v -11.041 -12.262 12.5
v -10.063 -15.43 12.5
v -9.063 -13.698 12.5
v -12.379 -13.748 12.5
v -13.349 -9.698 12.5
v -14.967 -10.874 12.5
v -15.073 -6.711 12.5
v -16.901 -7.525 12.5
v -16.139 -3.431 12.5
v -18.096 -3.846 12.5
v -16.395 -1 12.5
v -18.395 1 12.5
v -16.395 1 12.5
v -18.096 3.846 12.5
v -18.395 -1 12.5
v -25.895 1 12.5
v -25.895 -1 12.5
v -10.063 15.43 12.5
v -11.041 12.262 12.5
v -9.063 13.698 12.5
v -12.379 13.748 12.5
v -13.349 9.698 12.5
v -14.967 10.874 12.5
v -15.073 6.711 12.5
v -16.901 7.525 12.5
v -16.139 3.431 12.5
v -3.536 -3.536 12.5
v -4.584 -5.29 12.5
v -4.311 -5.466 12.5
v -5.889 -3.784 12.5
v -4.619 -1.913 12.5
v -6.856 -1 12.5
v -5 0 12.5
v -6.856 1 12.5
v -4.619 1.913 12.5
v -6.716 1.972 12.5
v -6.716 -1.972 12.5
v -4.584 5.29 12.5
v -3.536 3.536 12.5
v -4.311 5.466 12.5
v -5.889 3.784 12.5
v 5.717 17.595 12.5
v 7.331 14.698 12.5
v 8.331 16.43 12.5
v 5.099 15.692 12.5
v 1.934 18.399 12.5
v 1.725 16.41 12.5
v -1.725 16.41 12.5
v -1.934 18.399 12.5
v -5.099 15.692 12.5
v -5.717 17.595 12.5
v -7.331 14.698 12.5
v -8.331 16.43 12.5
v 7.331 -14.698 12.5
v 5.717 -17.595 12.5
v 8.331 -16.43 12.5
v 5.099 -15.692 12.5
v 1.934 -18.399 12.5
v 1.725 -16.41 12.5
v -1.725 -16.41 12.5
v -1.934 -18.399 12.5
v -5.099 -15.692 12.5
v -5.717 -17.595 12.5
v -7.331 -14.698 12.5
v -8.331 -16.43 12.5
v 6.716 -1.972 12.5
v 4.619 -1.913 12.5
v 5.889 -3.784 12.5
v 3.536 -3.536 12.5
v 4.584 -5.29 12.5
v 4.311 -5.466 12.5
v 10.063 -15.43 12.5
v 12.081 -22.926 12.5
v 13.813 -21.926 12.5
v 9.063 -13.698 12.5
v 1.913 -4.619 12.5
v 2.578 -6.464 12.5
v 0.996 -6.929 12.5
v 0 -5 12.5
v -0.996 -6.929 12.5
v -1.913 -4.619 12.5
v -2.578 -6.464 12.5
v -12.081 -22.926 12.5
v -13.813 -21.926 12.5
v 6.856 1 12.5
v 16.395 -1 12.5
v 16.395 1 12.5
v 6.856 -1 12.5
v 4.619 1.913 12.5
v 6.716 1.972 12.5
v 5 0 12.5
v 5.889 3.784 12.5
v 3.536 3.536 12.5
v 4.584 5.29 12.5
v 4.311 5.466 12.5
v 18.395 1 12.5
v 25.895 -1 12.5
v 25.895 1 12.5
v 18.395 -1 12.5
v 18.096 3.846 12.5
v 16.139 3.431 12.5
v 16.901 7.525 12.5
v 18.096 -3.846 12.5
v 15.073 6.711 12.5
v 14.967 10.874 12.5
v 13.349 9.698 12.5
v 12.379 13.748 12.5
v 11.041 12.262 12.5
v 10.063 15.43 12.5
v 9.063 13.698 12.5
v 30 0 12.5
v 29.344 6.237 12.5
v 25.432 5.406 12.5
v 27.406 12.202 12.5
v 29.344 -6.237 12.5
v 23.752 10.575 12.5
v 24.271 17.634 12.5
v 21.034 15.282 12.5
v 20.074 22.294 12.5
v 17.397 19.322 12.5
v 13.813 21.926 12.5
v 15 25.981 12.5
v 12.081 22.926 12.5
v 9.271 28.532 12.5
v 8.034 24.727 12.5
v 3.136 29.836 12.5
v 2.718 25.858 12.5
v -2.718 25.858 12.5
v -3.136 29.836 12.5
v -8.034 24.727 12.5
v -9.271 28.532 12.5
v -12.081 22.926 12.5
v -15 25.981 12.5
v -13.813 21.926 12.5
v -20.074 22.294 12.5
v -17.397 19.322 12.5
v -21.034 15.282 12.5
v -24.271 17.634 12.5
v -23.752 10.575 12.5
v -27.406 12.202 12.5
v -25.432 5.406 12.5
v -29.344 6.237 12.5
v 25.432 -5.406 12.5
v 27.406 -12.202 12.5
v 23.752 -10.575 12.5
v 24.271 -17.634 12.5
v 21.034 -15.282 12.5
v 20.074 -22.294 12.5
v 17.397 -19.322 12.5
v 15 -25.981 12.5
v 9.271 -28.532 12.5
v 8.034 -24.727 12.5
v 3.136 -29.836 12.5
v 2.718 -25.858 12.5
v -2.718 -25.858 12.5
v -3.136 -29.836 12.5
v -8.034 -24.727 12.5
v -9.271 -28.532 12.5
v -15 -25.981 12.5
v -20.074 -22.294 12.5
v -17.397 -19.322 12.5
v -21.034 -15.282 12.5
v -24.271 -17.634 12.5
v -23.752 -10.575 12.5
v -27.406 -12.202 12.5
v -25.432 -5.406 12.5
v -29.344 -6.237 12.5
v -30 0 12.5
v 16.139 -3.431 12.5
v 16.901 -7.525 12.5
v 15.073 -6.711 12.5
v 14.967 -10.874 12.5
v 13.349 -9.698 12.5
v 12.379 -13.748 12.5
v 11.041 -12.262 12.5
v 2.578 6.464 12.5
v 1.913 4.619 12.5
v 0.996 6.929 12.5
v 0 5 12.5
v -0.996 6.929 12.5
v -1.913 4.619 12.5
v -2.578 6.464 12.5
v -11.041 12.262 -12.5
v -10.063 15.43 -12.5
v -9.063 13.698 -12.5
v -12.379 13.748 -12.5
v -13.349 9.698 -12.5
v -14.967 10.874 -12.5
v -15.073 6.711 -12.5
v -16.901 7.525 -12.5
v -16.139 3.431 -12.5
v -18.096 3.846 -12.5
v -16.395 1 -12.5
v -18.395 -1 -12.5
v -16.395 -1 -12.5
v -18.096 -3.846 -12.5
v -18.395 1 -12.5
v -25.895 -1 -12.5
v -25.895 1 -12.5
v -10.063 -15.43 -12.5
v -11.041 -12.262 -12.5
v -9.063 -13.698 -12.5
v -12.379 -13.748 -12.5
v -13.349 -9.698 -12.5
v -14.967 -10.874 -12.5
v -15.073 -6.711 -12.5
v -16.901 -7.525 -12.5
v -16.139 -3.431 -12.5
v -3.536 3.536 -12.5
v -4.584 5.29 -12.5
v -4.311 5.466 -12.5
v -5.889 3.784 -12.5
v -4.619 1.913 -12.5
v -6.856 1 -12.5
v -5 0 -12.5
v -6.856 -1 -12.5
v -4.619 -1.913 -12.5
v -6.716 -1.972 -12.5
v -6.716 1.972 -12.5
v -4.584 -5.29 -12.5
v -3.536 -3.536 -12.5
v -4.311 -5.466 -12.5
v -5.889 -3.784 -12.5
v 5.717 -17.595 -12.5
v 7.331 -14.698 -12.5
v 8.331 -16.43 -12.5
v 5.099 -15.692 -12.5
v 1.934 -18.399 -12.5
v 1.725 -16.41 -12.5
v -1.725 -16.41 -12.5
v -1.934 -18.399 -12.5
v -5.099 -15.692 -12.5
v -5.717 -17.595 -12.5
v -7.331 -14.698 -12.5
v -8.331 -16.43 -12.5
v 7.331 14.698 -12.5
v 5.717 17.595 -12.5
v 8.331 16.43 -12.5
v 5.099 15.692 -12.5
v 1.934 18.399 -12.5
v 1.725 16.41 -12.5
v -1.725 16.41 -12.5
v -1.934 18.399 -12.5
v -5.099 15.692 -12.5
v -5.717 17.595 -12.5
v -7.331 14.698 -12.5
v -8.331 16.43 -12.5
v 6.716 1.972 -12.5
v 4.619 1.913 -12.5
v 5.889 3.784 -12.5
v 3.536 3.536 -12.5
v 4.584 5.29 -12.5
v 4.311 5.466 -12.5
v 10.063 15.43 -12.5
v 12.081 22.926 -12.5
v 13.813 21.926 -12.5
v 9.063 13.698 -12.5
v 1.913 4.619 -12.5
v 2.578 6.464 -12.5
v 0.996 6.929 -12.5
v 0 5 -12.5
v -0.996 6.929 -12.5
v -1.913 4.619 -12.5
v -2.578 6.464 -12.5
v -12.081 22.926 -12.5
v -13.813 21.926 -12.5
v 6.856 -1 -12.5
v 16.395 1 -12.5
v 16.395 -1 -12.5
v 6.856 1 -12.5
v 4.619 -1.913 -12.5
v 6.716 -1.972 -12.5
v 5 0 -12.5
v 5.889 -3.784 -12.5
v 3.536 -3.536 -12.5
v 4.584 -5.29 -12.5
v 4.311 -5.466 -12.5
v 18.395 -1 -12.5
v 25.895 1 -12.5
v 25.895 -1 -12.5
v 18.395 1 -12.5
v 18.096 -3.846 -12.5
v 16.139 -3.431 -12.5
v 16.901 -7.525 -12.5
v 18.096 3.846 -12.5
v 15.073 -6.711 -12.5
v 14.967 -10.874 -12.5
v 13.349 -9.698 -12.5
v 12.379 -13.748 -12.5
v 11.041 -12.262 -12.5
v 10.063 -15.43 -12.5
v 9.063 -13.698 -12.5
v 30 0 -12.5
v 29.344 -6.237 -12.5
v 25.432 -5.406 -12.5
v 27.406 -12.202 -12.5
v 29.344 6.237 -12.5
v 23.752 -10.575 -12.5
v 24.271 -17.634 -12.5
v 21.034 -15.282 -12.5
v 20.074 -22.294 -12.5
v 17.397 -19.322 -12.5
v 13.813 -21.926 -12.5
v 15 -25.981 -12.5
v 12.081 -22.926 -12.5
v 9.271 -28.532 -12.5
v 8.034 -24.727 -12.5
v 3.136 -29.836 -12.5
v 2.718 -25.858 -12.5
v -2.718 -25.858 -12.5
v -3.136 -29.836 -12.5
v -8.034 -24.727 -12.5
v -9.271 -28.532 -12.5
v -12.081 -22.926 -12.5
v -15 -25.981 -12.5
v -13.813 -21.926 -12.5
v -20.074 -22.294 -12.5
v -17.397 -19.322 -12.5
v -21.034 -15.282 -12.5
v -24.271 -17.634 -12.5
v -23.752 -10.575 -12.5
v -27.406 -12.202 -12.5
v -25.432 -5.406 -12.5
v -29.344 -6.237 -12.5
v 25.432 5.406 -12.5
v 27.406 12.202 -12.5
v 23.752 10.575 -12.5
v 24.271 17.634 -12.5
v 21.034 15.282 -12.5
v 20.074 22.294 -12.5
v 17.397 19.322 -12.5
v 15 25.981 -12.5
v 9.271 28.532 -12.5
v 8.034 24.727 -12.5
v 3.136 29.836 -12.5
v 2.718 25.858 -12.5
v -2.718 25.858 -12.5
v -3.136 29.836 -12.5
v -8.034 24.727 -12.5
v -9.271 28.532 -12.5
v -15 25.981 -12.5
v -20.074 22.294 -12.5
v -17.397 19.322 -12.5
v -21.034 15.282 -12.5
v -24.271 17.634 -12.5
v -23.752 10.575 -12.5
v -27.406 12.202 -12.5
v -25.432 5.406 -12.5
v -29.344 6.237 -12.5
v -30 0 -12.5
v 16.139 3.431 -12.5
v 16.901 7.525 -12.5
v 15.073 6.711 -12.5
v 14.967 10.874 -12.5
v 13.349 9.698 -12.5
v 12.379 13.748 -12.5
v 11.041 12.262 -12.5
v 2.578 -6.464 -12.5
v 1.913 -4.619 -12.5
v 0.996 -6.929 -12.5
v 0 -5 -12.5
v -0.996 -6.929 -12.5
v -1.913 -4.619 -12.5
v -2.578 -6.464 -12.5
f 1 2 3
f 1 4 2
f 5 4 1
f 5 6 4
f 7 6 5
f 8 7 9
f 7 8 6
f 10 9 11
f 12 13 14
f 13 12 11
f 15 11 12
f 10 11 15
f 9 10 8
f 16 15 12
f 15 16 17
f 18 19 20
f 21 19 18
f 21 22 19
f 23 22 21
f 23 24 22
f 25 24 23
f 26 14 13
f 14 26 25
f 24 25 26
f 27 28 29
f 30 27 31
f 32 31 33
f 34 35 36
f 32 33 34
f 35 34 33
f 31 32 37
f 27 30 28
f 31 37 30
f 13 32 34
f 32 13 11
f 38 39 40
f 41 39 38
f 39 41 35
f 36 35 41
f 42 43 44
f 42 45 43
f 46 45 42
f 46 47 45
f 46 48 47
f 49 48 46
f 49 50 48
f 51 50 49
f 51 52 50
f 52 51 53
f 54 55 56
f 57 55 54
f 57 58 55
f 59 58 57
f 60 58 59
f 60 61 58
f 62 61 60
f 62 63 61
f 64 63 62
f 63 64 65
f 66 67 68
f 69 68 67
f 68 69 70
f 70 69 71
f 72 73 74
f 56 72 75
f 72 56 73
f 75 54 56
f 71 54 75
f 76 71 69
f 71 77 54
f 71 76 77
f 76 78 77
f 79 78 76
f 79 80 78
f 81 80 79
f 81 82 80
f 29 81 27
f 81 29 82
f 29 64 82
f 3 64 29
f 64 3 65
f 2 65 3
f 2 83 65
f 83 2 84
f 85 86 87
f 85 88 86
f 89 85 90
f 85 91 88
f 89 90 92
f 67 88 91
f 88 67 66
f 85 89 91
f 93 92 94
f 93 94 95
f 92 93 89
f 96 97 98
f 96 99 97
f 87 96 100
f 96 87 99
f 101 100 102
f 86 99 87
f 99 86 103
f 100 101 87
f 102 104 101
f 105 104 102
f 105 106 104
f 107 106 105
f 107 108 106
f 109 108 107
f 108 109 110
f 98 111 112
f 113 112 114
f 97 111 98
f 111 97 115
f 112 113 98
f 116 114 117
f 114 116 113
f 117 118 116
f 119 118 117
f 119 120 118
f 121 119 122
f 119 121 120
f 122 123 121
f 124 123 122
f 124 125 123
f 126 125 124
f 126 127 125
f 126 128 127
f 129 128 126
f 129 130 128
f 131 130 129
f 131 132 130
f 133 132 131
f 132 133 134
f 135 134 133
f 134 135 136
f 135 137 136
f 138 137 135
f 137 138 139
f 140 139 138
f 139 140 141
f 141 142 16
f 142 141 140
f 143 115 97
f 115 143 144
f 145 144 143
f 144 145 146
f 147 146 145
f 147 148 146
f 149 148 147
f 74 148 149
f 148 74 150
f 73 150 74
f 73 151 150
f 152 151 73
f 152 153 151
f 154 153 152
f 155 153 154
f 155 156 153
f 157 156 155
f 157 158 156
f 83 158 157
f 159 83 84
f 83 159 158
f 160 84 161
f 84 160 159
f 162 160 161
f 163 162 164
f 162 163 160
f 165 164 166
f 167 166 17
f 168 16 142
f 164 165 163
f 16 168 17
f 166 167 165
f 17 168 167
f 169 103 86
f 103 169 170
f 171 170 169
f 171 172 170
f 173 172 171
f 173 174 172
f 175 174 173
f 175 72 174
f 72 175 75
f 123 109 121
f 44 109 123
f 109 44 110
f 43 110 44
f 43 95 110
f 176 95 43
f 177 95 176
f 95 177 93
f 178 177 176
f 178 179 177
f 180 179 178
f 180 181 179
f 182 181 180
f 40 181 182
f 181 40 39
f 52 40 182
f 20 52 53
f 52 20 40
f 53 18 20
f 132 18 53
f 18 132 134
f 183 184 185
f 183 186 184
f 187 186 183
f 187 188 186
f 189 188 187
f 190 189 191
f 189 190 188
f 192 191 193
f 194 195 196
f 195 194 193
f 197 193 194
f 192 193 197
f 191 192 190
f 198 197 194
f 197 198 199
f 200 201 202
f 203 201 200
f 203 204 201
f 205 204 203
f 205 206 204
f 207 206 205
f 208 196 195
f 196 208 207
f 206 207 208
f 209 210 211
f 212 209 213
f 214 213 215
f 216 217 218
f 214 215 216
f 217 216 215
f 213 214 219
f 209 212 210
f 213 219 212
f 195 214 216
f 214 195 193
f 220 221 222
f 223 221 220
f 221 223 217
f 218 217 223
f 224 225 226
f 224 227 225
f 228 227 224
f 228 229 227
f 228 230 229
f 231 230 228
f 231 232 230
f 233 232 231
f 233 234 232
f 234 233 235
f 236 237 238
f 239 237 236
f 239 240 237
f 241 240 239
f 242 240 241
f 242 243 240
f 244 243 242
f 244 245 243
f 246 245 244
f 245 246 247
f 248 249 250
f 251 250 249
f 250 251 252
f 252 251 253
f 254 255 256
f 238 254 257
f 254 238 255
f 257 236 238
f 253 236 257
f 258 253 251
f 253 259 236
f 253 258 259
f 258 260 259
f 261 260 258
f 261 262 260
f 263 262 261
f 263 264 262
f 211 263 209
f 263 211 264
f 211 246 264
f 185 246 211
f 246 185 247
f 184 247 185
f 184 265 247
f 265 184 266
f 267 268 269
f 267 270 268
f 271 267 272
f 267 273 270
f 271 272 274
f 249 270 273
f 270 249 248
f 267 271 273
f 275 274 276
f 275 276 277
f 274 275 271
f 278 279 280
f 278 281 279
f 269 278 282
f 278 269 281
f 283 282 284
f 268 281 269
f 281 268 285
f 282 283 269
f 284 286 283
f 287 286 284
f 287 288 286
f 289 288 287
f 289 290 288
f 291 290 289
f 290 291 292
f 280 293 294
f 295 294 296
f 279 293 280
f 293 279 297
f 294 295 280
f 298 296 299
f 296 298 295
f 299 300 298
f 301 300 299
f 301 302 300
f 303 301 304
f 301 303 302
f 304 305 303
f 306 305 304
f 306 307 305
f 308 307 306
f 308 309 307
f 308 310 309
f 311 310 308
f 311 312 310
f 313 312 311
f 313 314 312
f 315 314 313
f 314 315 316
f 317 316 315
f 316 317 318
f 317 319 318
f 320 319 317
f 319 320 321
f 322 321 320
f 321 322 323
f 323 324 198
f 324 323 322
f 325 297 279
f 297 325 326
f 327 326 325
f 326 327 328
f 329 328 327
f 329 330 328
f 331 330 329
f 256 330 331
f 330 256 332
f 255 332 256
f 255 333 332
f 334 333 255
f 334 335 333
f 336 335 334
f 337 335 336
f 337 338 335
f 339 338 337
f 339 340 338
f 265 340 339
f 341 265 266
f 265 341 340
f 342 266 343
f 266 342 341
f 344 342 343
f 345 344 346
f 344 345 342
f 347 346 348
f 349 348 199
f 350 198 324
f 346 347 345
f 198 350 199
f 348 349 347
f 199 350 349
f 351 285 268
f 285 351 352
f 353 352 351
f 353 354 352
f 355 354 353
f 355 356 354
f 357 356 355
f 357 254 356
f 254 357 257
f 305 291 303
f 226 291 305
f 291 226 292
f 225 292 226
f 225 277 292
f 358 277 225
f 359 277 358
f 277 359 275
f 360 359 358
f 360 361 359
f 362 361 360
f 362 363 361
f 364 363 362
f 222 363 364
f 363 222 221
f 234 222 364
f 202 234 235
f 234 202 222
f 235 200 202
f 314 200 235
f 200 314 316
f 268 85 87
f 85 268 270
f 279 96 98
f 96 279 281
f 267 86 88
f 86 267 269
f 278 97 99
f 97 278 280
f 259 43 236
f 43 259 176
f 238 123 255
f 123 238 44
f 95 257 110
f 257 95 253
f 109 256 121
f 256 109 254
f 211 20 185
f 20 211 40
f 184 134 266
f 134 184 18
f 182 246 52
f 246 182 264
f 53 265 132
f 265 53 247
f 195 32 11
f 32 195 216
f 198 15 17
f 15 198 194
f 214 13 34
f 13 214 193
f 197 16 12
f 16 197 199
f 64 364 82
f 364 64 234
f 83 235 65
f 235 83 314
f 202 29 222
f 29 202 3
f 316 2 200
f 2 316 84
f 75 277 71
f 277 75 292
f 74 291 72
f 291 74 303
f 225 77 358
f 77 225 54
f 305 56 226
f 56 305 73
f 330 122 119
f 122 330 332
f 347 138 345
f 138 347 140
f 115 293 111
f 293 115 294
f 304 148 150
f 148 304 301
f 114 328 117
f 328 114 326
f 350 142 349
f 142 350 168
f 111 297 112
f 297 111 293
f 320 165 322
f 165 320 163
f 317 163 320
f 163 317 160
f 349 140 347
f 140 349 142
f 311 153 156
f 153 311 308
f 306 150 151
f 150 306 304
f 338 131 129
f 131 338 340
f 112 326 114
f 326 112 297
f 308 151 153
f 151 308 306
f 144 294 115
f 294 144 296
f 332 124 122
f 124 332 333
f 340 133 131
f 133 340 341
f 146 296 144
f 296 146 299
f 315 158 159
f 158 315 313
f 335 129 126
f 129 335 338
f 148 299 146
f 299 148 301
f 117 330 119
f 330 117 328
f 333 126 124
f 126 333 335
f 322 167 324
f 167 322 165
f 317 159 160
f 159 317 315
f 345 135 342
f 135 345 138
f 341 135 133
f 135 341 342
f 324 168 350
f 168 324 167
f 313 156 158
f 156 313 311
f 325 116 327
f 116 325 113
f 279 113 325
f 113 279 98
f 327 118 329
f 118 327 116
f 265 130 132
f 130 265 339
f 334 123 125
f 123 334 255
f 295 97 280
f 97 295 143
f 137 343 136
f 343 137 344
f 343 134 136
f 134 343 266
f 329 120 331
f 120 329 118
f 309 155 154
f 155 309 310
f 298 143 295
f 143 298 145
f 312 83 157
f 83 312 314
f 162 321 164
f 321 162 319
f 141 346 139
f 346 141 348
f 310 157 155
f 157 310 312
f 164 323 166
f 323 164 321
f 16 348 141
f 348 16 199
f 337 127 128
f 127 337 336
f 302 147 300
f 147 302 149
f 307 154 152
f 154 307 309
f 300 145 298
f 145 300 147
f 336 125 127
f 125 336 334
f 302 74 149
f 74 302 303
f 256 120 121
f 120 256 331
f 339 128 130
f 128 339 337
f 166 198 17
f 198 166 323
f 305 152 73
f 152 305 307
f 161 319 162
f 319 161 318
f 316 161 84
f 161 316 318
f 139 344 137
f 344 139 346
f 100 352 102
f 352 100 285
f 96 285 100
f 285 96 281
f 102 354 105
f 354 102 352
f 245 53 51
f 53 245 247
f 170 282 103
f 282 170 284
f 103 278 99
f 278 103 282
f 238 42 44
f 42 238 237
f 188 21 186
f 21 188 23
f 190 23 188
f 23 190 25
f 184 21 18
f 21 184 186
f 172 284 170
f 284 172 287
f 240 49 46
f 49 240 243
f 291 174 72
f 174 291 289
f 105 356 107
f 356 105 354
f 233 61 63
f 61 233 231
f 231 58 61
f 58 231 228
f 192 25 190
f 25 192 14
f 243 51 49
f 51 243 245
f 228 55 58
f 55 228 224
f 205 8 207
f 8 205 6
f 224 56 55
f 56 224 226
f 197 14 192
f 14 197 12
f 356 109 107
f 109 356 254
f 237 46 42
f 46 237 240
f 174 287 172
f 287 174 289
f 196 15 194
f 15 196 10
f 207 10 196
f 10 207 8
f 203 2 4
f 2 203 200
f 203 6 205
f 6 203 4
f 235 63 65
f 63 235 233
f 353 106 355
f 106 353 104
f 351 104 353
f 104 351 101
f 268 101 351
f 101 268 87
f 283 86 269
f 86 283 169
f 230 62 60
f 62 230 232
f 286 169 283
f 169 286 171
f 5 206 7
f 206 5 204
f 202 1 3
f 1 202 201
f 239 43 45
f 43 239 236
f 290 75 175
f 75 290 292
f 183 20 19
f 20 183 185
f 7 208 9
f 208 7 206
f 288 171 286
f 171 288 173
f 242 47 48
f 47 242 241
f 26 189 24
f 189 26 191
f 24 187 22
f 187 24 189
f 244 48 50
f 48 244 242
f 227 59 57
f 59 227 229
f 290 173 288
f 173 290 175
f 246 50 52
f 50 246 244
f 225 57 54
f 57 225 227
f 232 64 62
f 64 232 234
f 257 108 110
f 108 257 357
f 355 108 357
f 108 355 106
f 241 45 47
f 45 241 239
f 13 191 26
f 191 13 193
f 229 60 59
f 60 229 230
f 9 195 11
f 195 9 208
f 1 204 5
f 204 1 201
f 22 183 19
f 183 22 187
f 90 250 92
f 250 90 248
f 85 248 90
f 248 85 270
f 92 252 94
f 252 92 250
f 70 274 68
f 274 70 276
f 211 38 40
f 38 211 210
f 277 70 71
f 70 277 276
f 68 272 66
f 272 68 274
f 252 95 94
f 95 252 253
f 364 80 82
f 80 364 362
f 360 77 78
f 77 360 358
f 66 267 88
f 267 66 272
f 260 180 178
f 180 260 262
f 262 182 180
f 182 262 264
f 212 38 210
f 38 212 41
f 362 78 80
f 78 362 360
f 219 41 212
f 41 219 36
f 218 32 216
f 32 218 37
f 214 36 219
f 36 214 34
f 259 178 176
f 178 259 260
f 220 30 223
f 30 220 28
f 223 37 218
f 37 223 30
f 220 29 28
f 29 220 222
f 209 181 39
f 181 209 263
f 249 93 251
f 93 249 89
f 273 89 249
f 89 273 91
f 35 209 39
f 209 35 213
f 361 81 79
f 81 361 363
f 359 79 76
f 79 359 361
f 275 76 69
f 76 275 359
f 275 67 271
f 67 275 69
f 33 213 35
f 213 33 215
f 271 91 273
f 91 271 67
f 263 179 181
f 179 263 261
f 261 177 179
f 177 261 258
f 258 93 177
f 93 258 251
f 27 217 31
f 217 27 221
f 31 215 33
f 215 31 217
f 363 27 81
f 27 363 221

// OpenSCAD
//Customizable Crush Tube
//by eriqjo, March 2016


//CUSTOMIZER VARIABLES

//Height of tube, mm
Tube_Height = 25;

//Diameter of center hole, mm
Hole_Diameter = 10;

//Width of inner ring, mm
Inner_Width = 4;

//Outer diameter of tube, mm
Outer_Diameter = 60;

//Width of outer rings, mm
Outer_Width = 4;

//Number of spokes
Spoke_Quantity = 6; // [3:18]

//Width of spokes, mm
Spoke_Width = 2;

//Number of additional rings
Additional_Rings = 1;

//Width of additional rings, mm
Add_Ring_Width = 2;

//CUSTOMIZER VARIABLES END

errorFree = false;
errorFree = true;

if (errorFree){
	difference(){
		union(){
			spokes();
			outerRing();
			extraRings();
			centerRing();
		}//union
		centerHole();
	}//diff
}//if

else{
	//TODO error messages here
}//else

module spokes(){
	spokeAngle = 360/Spoke_Quantity;
	for (i=[0:Spoke_Quantity-1]){
		rotate([0, 0, i*spokeAngle])
			translate([((Outer_Diameter/2)-(Outer_Width/2))/2, 0, 0])
				cube([(Outer_Diameter/2)-(Outer_Width/2), Spoke_Width, Tube_Height], center = true);
	}//for
}//module spokes

module outerRing(){
	difference(){
		cylinder(h = Tube_Height, d = Outer_Diameter, center = true);
		cylinder(h = Tube_Height + 1, d = Outer_Diameter - (2 * Outer_Width), center = true);
	}//difference
}//module outerRing

module extraRings(){
	dimA = (Hole_Diameter/2) + Inner_Width;
	dimB = (Outer_Diameter/2) - dimA - Outer_Width;
	dimR = (dimB/(Additional_Rings + 1));
	if (Additional_Rings > 0){
		for(i = [1 : Additional_Rings]){
			difference(){
				cylinder(h = Tube_Height, r = dimA + i*dimR + Add_Ring_Width/2, center = true);
				cylinder(h = Tube_Height + 1, r = dimA + i*dimR - Add_Ring_Width/2, center = true);
			}//difference
		}//for
	}//if
}//module extraRings

module centerRing(){
	cylinder(h = Tube_Height, d = Hole_Diameter + Inner_Width, center = true);
}//module centerRing

module centerHole(){
	cylinder(h = Tube_Height + 1, d = Hole_Diameter, center = true);
}//module centerHole


















